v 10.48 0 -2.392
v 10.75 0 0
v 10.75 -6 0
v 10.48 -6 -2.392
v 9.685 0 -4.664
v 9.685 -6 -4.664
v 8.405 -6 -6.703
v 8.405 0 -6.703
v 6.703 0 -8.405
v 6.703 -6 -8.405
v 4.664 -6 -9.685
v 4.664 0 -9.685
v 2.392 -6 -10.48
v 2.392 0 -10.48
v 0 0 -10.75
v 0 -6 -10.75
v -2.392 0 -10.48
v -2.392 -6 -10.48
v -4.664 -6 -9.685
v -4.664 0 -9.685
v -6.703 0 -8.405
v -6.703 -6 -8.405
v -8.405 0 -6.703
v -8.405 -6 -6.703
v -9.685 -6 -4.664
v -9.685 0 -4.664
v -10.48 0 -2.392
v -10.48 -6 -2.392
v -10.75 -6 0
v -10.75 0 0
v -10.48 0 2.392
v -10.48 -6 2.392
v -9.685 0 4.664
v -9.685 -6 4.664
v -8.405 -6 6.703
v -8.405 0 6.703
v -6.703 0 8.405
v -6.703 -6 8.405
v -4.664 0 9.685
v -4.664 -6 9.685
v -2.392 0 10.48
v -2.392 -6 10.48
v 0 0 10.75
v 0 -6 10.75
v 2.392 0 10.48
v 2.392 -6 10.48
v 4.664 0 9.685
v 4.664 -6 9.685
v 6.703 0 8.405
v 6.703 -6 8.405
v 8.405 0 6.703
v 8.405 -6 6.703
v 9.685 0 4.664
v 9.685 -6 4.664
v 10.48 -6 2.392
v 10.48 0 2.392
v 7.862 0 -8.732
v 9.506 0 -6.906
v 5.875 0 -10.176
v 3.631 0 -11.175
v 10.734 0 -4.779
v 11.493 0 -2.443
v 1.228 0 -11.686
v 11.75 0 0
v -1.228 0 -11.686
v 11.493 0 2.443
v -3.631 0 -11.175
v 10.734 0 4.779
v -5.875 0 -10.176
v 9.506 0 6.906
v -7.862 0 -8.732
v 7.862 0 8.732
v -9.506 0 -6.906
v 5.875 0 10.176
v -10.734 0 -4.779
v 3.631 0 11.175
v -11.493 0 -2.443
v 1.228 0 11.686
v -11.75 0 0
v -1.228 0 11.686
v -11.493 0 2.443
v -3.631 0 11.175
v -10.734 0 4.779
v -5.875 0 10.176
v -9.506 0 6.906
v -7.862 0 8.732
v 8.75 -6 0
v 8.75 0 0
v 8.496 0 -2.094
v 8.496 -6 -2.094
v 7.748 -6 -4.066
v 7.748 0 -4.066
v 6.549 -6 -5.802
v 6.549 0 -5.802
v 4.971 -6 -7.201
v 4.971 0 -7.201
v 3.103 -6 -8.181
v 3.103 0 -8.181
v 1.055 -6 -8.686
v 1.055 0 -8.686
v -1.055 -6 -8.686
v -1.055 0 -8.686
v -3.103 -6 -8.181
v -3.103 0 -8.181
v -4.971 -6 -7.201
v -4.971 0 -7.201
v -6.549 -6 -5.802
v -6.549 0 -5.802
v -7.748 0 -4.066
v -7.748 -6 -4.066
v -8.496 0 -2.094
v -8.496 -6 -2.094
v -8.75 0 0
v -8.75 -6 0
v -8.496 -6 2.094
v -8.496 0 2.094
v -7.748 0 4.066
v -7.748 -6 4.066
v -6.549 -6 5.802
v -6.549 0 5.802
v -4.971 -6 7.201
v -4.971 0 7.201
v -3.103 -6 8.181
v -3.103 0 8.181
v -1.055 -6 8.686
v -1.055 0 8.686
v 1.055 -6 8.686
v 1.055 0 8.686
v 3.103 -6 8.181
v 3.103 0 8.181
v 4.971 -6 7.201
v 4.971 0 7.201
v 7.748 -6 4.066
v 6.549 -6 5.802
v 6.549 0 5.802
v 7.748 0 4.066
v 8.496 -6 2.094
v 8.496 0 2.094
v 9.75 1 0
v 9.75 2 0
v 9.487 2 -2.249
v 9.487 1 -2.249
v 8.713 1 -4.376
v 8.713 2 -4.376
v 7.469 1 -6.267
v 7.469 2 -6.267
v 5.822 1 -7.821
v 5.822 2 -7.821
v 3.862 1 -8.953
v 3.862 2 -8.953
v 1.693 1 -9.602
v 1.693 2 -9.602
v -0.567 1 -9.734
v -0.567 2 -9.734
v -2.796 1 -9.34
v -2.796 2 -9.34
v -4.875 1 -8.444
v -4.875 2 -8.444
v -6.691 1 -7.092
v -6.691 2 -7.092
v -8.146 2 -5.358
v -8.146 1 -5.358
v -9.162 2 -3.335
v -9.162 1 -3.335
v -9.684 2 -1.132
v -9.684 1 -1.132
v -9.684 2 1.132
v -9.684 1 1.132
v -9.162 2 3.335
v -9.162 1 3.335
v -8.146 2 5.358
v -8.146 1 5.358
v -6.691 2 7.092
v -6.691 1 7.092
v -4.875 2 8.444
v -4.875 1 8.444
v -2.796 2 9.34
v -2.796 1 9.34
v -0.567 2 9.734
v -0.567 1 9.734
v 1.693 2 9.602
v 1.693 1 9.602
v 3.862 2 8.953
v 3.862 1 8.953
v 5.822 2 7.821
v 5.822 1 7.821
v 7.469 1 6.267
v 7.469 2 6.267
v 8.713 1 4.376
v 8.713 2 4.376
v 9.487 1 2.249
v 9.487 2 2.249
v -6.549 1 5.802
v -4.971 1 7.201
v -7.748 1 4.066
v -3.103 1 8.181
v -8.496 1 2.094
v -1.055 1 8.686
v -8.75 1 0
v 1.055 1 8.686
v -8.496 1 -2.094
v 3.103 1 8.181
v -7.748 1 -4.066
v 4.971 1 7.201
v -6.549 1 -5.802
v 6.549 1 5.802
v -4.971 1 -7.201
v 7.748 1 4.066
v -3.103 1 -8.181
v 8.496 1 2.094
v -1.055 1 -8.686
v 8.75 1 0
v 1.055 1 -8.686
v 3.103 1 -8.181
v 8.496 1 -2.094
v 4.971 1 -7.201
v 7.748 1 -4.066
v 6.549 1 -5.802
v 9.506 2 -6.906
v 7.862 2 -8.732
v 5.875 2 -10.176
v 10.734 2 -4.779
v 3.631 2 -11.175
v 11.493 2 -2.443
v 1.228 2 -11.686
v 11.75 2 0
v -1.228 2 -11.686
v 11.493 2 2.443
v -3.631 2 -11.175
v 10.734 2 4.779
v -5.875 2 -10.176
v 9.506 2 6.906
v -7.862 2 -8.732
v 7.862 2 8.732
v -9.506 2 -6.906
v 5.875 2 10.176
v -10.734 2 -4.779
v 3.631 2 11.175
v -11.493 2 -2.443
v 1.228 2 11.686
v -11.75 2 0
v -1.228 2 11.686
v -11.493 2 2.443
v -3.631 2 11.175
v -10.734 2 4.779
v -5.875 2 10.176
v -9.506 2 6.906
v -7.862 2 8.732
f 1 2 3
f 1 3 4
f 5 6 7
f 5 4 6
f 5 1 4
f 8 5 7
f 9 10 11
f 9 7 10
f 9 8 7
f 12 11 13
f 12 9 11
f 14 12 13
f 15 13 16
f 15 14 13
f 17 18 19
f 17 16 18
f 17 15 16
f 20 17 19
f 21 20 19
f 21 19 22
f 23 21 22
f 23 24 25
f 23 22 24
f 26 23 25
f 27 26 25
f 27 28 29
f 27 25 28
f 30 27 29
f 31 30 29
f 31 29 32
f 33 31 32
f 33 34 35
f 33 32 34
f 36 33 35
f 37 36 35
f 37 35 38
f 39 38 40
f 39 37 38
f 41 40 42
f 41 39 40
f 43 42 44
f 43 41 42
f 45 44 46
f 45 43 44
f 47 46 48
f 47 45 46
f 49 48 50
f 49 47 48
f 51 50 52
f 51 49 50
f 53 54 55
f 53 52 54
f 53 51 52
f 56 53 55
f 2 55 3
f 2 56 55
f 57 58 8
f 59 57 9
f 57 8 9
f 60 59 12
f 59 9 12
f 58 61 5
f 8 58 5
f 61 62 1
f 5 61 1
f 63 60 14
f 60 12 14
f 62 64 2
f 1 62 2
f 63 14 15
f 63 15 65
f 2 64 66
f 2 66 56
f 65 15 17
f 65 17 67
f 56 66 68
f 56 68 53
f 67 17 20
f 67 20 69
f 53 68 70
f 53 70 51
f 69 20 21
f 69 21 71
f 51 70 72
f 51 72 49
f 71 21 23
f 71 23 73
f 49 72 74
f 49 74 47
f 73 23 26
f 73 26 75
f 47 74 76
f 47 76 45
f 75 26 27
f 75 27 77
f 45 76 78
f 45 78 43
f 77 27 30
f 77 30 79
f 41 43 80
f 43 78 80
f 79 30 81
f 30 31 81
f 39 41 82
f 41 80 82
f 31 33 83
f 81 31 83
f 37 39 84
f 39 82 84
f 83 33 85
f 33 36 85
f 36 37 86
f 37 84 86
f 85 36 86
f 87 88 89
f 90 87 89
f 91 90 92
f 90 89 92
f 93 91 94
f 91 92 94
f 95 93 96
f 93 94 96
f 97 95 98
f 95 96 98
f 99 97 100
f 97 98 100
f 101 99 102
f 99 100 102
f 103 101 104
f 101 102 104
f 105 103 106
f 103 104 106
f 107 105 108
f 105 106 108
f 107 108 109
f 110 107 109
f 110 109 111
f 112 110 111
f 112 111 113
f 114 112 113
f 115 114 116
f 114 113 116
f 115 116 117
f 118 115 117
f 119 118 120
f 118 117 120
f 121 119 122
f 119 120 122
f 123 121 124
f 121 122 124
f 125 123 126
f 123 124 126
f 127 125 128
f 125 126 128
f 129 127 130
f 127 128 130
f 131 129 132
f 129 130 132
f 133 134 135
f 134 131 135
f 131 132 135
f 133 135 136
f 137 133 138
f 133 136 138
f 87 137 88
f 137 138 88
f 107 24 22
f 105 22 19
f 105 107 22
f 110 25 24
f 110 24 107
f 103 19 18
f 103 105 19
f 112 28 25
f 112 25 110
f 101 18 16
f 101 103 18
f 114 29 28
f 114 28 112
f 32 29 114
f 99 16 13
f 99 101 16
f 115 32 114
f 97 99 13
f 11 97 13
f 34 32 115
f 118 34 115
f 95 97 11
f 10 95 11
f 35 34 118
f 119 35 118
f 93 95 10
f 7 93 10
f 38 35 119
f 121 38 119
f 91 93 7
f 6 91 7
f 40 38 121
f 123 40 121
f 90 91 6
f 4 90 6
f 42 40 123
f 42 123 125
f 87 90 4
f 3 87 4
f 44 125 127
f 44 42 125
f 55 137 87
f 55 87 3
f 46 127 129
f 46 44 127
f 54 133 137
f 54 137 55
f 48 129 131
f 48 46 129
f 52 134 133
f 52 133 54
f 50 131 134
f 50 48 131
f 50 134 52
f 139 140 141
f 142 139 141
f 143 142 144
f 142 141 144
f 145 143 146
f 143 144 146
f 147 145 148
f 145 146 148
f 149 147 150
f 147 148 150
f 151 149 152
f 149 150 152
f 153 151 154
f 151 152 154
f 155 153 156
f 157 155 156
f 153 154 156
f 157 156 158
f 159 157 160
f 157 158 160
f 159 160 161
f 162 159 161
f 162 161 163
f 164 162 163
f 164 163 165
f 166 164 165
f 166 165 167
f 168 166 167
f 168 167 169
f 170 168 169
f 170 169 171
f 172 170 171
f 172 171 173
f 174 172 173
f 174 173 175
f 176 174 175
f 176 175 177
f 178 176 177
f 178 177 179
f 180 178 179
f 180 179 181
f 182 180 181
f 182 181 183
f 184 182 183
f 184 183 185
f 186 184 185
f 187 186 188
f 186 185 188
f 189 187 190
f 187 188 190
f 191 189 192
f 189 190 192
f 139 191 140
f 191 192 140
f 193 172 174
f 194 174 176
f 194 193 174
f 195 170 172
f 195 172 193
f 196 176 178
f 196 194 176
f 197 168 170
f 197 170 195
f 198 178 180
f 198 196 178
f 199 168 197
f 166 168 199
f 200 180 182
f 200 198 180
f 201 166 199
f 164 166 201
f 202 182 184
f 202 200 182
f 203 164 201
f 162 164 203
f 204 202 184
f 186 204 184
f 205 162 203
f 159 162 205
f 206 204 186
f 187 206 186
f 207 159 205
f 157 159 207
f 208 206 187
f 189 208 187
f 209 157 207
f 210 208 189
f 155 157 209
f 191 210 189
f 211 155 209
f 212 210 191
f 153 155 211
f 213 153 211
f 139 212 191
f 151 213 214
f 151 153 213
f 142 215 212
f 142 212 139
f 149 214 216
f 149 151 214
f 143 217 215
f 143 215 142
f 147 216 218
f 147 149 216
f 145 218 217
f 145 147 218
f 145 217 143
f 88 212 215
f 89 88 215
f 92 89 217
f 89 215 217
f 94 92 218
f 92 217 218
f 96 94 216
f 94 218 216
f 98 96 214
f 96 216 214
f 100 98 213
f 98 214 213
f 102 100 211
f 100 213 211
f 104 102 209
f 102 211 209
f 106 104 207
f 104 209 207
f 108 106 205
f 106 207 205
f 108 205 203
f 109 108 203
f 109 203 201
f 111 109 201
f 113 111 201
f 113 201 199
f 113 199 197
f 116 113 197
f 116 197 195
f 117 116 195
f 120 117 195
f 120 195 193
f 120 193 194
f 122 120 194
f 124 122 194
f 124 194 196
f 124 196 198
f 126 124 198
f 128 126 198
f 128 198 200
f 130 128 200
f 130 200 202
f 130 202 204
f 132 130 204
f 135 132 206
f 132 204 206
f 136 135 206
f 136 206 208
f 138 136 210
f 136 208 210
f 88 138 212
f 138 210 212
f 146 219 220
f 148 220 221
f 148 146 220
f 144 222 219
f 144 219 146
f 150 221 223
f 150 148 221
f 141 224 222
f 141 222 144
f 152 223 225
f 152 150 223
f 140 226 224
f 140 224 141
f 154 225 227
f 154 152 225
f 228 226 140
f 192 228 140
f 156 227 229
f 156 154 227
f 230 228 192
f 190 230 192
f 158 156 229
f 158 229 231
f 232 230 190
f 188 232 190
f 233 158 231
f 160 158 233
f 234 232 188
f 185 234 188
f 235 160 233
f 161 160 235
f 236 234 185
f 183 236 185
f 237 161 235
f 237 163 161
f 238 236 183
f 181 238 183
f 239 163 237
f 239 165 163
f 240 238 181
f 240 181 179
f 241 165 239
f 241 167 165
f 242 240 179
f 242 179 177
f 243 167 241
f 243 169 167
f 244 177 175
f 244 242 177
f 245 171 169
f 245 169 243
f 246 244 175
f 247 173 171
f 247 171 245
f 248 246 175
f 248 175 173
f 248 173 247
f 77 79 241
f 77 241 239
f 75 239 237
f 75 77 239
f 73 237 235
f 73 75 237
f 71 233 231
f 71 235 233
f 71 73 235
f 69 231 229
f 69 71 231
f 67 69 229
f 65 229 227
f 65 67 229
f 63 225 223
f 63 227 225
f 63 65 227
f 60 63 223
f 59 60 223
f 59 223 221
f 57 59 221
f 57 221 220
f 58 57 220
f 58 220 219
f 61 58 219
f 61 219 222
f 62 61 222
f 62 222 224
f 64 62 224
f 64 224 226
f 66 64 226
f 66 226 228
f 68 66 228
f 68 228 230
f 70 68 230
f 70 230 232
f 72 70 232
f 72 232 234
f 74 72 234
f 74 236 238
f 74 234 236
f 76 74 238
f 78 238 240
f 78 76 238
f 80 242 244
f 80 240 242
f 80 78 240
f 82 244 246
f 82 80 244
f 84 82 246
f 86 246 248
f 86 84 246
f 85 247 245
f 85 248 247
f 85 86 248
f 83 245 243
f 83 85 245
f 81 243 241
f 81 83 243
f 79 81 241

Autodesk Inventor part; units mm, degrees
ref_plane "YZ Plane" through (0, 0, 0) normal (1, 0, 0) x (0, 1, 0)
ref_plane "XZ Plane" through (0, 0, 0) normal (0, 1, 0) x (-1, 0, 0)
ref_plane "XY Plane" through (0, 0, 0) normal (0, 0, 1) x (1, 0, 0)
sketch "Sketch1" plane through (0, 0, 0) normal (0, 1, 0) x (-1, 0, 0)
  circle A0 centre (0, 0) radius 9.75
  circle A1 centre (0, 0) radius 11.75
  dimension "d0" = 19.5
  dimension "d1" = 23.5
extrude "Extrusion1" add sketch "Sketch1" along normal blind 2 contours A0 | A1
sketch "Sketch2" plane through (0, 2, 0) normal (0, 1, 0) x (1, 0, 0)
  circle A0 centre (0, 0) radius 9.75
  dimension "d4" = 19.5
extrude "Extrusion2" cut sketch "Sketch2" against normal blind 1
sketch "Sketch3" plane through (0, 1, 0) normal (0, 1, 0) x (1, 0, 0)
  circle A0 centre (0, 0) radius 8.75
  dimension "d7" = 17.5
extrude "Extrusion3" cut sketch "Sketch3" against normal blind 1
sketch "Sketch4" plane through (0, 0, 0) normal (0, -1, 0) x (1, 0, 0)
  circle A0 centre (0, 0) radius 8.75
  circle A1 centre (0, 0) radius 10.75
  dimension "d10" = 21.5
  dimension "d13" = 17.5
extrude "Extrusion4" add sketch "Sketch4" along normal blind 6
properties part number "685ZZFlanged_Adapter_4mm"
